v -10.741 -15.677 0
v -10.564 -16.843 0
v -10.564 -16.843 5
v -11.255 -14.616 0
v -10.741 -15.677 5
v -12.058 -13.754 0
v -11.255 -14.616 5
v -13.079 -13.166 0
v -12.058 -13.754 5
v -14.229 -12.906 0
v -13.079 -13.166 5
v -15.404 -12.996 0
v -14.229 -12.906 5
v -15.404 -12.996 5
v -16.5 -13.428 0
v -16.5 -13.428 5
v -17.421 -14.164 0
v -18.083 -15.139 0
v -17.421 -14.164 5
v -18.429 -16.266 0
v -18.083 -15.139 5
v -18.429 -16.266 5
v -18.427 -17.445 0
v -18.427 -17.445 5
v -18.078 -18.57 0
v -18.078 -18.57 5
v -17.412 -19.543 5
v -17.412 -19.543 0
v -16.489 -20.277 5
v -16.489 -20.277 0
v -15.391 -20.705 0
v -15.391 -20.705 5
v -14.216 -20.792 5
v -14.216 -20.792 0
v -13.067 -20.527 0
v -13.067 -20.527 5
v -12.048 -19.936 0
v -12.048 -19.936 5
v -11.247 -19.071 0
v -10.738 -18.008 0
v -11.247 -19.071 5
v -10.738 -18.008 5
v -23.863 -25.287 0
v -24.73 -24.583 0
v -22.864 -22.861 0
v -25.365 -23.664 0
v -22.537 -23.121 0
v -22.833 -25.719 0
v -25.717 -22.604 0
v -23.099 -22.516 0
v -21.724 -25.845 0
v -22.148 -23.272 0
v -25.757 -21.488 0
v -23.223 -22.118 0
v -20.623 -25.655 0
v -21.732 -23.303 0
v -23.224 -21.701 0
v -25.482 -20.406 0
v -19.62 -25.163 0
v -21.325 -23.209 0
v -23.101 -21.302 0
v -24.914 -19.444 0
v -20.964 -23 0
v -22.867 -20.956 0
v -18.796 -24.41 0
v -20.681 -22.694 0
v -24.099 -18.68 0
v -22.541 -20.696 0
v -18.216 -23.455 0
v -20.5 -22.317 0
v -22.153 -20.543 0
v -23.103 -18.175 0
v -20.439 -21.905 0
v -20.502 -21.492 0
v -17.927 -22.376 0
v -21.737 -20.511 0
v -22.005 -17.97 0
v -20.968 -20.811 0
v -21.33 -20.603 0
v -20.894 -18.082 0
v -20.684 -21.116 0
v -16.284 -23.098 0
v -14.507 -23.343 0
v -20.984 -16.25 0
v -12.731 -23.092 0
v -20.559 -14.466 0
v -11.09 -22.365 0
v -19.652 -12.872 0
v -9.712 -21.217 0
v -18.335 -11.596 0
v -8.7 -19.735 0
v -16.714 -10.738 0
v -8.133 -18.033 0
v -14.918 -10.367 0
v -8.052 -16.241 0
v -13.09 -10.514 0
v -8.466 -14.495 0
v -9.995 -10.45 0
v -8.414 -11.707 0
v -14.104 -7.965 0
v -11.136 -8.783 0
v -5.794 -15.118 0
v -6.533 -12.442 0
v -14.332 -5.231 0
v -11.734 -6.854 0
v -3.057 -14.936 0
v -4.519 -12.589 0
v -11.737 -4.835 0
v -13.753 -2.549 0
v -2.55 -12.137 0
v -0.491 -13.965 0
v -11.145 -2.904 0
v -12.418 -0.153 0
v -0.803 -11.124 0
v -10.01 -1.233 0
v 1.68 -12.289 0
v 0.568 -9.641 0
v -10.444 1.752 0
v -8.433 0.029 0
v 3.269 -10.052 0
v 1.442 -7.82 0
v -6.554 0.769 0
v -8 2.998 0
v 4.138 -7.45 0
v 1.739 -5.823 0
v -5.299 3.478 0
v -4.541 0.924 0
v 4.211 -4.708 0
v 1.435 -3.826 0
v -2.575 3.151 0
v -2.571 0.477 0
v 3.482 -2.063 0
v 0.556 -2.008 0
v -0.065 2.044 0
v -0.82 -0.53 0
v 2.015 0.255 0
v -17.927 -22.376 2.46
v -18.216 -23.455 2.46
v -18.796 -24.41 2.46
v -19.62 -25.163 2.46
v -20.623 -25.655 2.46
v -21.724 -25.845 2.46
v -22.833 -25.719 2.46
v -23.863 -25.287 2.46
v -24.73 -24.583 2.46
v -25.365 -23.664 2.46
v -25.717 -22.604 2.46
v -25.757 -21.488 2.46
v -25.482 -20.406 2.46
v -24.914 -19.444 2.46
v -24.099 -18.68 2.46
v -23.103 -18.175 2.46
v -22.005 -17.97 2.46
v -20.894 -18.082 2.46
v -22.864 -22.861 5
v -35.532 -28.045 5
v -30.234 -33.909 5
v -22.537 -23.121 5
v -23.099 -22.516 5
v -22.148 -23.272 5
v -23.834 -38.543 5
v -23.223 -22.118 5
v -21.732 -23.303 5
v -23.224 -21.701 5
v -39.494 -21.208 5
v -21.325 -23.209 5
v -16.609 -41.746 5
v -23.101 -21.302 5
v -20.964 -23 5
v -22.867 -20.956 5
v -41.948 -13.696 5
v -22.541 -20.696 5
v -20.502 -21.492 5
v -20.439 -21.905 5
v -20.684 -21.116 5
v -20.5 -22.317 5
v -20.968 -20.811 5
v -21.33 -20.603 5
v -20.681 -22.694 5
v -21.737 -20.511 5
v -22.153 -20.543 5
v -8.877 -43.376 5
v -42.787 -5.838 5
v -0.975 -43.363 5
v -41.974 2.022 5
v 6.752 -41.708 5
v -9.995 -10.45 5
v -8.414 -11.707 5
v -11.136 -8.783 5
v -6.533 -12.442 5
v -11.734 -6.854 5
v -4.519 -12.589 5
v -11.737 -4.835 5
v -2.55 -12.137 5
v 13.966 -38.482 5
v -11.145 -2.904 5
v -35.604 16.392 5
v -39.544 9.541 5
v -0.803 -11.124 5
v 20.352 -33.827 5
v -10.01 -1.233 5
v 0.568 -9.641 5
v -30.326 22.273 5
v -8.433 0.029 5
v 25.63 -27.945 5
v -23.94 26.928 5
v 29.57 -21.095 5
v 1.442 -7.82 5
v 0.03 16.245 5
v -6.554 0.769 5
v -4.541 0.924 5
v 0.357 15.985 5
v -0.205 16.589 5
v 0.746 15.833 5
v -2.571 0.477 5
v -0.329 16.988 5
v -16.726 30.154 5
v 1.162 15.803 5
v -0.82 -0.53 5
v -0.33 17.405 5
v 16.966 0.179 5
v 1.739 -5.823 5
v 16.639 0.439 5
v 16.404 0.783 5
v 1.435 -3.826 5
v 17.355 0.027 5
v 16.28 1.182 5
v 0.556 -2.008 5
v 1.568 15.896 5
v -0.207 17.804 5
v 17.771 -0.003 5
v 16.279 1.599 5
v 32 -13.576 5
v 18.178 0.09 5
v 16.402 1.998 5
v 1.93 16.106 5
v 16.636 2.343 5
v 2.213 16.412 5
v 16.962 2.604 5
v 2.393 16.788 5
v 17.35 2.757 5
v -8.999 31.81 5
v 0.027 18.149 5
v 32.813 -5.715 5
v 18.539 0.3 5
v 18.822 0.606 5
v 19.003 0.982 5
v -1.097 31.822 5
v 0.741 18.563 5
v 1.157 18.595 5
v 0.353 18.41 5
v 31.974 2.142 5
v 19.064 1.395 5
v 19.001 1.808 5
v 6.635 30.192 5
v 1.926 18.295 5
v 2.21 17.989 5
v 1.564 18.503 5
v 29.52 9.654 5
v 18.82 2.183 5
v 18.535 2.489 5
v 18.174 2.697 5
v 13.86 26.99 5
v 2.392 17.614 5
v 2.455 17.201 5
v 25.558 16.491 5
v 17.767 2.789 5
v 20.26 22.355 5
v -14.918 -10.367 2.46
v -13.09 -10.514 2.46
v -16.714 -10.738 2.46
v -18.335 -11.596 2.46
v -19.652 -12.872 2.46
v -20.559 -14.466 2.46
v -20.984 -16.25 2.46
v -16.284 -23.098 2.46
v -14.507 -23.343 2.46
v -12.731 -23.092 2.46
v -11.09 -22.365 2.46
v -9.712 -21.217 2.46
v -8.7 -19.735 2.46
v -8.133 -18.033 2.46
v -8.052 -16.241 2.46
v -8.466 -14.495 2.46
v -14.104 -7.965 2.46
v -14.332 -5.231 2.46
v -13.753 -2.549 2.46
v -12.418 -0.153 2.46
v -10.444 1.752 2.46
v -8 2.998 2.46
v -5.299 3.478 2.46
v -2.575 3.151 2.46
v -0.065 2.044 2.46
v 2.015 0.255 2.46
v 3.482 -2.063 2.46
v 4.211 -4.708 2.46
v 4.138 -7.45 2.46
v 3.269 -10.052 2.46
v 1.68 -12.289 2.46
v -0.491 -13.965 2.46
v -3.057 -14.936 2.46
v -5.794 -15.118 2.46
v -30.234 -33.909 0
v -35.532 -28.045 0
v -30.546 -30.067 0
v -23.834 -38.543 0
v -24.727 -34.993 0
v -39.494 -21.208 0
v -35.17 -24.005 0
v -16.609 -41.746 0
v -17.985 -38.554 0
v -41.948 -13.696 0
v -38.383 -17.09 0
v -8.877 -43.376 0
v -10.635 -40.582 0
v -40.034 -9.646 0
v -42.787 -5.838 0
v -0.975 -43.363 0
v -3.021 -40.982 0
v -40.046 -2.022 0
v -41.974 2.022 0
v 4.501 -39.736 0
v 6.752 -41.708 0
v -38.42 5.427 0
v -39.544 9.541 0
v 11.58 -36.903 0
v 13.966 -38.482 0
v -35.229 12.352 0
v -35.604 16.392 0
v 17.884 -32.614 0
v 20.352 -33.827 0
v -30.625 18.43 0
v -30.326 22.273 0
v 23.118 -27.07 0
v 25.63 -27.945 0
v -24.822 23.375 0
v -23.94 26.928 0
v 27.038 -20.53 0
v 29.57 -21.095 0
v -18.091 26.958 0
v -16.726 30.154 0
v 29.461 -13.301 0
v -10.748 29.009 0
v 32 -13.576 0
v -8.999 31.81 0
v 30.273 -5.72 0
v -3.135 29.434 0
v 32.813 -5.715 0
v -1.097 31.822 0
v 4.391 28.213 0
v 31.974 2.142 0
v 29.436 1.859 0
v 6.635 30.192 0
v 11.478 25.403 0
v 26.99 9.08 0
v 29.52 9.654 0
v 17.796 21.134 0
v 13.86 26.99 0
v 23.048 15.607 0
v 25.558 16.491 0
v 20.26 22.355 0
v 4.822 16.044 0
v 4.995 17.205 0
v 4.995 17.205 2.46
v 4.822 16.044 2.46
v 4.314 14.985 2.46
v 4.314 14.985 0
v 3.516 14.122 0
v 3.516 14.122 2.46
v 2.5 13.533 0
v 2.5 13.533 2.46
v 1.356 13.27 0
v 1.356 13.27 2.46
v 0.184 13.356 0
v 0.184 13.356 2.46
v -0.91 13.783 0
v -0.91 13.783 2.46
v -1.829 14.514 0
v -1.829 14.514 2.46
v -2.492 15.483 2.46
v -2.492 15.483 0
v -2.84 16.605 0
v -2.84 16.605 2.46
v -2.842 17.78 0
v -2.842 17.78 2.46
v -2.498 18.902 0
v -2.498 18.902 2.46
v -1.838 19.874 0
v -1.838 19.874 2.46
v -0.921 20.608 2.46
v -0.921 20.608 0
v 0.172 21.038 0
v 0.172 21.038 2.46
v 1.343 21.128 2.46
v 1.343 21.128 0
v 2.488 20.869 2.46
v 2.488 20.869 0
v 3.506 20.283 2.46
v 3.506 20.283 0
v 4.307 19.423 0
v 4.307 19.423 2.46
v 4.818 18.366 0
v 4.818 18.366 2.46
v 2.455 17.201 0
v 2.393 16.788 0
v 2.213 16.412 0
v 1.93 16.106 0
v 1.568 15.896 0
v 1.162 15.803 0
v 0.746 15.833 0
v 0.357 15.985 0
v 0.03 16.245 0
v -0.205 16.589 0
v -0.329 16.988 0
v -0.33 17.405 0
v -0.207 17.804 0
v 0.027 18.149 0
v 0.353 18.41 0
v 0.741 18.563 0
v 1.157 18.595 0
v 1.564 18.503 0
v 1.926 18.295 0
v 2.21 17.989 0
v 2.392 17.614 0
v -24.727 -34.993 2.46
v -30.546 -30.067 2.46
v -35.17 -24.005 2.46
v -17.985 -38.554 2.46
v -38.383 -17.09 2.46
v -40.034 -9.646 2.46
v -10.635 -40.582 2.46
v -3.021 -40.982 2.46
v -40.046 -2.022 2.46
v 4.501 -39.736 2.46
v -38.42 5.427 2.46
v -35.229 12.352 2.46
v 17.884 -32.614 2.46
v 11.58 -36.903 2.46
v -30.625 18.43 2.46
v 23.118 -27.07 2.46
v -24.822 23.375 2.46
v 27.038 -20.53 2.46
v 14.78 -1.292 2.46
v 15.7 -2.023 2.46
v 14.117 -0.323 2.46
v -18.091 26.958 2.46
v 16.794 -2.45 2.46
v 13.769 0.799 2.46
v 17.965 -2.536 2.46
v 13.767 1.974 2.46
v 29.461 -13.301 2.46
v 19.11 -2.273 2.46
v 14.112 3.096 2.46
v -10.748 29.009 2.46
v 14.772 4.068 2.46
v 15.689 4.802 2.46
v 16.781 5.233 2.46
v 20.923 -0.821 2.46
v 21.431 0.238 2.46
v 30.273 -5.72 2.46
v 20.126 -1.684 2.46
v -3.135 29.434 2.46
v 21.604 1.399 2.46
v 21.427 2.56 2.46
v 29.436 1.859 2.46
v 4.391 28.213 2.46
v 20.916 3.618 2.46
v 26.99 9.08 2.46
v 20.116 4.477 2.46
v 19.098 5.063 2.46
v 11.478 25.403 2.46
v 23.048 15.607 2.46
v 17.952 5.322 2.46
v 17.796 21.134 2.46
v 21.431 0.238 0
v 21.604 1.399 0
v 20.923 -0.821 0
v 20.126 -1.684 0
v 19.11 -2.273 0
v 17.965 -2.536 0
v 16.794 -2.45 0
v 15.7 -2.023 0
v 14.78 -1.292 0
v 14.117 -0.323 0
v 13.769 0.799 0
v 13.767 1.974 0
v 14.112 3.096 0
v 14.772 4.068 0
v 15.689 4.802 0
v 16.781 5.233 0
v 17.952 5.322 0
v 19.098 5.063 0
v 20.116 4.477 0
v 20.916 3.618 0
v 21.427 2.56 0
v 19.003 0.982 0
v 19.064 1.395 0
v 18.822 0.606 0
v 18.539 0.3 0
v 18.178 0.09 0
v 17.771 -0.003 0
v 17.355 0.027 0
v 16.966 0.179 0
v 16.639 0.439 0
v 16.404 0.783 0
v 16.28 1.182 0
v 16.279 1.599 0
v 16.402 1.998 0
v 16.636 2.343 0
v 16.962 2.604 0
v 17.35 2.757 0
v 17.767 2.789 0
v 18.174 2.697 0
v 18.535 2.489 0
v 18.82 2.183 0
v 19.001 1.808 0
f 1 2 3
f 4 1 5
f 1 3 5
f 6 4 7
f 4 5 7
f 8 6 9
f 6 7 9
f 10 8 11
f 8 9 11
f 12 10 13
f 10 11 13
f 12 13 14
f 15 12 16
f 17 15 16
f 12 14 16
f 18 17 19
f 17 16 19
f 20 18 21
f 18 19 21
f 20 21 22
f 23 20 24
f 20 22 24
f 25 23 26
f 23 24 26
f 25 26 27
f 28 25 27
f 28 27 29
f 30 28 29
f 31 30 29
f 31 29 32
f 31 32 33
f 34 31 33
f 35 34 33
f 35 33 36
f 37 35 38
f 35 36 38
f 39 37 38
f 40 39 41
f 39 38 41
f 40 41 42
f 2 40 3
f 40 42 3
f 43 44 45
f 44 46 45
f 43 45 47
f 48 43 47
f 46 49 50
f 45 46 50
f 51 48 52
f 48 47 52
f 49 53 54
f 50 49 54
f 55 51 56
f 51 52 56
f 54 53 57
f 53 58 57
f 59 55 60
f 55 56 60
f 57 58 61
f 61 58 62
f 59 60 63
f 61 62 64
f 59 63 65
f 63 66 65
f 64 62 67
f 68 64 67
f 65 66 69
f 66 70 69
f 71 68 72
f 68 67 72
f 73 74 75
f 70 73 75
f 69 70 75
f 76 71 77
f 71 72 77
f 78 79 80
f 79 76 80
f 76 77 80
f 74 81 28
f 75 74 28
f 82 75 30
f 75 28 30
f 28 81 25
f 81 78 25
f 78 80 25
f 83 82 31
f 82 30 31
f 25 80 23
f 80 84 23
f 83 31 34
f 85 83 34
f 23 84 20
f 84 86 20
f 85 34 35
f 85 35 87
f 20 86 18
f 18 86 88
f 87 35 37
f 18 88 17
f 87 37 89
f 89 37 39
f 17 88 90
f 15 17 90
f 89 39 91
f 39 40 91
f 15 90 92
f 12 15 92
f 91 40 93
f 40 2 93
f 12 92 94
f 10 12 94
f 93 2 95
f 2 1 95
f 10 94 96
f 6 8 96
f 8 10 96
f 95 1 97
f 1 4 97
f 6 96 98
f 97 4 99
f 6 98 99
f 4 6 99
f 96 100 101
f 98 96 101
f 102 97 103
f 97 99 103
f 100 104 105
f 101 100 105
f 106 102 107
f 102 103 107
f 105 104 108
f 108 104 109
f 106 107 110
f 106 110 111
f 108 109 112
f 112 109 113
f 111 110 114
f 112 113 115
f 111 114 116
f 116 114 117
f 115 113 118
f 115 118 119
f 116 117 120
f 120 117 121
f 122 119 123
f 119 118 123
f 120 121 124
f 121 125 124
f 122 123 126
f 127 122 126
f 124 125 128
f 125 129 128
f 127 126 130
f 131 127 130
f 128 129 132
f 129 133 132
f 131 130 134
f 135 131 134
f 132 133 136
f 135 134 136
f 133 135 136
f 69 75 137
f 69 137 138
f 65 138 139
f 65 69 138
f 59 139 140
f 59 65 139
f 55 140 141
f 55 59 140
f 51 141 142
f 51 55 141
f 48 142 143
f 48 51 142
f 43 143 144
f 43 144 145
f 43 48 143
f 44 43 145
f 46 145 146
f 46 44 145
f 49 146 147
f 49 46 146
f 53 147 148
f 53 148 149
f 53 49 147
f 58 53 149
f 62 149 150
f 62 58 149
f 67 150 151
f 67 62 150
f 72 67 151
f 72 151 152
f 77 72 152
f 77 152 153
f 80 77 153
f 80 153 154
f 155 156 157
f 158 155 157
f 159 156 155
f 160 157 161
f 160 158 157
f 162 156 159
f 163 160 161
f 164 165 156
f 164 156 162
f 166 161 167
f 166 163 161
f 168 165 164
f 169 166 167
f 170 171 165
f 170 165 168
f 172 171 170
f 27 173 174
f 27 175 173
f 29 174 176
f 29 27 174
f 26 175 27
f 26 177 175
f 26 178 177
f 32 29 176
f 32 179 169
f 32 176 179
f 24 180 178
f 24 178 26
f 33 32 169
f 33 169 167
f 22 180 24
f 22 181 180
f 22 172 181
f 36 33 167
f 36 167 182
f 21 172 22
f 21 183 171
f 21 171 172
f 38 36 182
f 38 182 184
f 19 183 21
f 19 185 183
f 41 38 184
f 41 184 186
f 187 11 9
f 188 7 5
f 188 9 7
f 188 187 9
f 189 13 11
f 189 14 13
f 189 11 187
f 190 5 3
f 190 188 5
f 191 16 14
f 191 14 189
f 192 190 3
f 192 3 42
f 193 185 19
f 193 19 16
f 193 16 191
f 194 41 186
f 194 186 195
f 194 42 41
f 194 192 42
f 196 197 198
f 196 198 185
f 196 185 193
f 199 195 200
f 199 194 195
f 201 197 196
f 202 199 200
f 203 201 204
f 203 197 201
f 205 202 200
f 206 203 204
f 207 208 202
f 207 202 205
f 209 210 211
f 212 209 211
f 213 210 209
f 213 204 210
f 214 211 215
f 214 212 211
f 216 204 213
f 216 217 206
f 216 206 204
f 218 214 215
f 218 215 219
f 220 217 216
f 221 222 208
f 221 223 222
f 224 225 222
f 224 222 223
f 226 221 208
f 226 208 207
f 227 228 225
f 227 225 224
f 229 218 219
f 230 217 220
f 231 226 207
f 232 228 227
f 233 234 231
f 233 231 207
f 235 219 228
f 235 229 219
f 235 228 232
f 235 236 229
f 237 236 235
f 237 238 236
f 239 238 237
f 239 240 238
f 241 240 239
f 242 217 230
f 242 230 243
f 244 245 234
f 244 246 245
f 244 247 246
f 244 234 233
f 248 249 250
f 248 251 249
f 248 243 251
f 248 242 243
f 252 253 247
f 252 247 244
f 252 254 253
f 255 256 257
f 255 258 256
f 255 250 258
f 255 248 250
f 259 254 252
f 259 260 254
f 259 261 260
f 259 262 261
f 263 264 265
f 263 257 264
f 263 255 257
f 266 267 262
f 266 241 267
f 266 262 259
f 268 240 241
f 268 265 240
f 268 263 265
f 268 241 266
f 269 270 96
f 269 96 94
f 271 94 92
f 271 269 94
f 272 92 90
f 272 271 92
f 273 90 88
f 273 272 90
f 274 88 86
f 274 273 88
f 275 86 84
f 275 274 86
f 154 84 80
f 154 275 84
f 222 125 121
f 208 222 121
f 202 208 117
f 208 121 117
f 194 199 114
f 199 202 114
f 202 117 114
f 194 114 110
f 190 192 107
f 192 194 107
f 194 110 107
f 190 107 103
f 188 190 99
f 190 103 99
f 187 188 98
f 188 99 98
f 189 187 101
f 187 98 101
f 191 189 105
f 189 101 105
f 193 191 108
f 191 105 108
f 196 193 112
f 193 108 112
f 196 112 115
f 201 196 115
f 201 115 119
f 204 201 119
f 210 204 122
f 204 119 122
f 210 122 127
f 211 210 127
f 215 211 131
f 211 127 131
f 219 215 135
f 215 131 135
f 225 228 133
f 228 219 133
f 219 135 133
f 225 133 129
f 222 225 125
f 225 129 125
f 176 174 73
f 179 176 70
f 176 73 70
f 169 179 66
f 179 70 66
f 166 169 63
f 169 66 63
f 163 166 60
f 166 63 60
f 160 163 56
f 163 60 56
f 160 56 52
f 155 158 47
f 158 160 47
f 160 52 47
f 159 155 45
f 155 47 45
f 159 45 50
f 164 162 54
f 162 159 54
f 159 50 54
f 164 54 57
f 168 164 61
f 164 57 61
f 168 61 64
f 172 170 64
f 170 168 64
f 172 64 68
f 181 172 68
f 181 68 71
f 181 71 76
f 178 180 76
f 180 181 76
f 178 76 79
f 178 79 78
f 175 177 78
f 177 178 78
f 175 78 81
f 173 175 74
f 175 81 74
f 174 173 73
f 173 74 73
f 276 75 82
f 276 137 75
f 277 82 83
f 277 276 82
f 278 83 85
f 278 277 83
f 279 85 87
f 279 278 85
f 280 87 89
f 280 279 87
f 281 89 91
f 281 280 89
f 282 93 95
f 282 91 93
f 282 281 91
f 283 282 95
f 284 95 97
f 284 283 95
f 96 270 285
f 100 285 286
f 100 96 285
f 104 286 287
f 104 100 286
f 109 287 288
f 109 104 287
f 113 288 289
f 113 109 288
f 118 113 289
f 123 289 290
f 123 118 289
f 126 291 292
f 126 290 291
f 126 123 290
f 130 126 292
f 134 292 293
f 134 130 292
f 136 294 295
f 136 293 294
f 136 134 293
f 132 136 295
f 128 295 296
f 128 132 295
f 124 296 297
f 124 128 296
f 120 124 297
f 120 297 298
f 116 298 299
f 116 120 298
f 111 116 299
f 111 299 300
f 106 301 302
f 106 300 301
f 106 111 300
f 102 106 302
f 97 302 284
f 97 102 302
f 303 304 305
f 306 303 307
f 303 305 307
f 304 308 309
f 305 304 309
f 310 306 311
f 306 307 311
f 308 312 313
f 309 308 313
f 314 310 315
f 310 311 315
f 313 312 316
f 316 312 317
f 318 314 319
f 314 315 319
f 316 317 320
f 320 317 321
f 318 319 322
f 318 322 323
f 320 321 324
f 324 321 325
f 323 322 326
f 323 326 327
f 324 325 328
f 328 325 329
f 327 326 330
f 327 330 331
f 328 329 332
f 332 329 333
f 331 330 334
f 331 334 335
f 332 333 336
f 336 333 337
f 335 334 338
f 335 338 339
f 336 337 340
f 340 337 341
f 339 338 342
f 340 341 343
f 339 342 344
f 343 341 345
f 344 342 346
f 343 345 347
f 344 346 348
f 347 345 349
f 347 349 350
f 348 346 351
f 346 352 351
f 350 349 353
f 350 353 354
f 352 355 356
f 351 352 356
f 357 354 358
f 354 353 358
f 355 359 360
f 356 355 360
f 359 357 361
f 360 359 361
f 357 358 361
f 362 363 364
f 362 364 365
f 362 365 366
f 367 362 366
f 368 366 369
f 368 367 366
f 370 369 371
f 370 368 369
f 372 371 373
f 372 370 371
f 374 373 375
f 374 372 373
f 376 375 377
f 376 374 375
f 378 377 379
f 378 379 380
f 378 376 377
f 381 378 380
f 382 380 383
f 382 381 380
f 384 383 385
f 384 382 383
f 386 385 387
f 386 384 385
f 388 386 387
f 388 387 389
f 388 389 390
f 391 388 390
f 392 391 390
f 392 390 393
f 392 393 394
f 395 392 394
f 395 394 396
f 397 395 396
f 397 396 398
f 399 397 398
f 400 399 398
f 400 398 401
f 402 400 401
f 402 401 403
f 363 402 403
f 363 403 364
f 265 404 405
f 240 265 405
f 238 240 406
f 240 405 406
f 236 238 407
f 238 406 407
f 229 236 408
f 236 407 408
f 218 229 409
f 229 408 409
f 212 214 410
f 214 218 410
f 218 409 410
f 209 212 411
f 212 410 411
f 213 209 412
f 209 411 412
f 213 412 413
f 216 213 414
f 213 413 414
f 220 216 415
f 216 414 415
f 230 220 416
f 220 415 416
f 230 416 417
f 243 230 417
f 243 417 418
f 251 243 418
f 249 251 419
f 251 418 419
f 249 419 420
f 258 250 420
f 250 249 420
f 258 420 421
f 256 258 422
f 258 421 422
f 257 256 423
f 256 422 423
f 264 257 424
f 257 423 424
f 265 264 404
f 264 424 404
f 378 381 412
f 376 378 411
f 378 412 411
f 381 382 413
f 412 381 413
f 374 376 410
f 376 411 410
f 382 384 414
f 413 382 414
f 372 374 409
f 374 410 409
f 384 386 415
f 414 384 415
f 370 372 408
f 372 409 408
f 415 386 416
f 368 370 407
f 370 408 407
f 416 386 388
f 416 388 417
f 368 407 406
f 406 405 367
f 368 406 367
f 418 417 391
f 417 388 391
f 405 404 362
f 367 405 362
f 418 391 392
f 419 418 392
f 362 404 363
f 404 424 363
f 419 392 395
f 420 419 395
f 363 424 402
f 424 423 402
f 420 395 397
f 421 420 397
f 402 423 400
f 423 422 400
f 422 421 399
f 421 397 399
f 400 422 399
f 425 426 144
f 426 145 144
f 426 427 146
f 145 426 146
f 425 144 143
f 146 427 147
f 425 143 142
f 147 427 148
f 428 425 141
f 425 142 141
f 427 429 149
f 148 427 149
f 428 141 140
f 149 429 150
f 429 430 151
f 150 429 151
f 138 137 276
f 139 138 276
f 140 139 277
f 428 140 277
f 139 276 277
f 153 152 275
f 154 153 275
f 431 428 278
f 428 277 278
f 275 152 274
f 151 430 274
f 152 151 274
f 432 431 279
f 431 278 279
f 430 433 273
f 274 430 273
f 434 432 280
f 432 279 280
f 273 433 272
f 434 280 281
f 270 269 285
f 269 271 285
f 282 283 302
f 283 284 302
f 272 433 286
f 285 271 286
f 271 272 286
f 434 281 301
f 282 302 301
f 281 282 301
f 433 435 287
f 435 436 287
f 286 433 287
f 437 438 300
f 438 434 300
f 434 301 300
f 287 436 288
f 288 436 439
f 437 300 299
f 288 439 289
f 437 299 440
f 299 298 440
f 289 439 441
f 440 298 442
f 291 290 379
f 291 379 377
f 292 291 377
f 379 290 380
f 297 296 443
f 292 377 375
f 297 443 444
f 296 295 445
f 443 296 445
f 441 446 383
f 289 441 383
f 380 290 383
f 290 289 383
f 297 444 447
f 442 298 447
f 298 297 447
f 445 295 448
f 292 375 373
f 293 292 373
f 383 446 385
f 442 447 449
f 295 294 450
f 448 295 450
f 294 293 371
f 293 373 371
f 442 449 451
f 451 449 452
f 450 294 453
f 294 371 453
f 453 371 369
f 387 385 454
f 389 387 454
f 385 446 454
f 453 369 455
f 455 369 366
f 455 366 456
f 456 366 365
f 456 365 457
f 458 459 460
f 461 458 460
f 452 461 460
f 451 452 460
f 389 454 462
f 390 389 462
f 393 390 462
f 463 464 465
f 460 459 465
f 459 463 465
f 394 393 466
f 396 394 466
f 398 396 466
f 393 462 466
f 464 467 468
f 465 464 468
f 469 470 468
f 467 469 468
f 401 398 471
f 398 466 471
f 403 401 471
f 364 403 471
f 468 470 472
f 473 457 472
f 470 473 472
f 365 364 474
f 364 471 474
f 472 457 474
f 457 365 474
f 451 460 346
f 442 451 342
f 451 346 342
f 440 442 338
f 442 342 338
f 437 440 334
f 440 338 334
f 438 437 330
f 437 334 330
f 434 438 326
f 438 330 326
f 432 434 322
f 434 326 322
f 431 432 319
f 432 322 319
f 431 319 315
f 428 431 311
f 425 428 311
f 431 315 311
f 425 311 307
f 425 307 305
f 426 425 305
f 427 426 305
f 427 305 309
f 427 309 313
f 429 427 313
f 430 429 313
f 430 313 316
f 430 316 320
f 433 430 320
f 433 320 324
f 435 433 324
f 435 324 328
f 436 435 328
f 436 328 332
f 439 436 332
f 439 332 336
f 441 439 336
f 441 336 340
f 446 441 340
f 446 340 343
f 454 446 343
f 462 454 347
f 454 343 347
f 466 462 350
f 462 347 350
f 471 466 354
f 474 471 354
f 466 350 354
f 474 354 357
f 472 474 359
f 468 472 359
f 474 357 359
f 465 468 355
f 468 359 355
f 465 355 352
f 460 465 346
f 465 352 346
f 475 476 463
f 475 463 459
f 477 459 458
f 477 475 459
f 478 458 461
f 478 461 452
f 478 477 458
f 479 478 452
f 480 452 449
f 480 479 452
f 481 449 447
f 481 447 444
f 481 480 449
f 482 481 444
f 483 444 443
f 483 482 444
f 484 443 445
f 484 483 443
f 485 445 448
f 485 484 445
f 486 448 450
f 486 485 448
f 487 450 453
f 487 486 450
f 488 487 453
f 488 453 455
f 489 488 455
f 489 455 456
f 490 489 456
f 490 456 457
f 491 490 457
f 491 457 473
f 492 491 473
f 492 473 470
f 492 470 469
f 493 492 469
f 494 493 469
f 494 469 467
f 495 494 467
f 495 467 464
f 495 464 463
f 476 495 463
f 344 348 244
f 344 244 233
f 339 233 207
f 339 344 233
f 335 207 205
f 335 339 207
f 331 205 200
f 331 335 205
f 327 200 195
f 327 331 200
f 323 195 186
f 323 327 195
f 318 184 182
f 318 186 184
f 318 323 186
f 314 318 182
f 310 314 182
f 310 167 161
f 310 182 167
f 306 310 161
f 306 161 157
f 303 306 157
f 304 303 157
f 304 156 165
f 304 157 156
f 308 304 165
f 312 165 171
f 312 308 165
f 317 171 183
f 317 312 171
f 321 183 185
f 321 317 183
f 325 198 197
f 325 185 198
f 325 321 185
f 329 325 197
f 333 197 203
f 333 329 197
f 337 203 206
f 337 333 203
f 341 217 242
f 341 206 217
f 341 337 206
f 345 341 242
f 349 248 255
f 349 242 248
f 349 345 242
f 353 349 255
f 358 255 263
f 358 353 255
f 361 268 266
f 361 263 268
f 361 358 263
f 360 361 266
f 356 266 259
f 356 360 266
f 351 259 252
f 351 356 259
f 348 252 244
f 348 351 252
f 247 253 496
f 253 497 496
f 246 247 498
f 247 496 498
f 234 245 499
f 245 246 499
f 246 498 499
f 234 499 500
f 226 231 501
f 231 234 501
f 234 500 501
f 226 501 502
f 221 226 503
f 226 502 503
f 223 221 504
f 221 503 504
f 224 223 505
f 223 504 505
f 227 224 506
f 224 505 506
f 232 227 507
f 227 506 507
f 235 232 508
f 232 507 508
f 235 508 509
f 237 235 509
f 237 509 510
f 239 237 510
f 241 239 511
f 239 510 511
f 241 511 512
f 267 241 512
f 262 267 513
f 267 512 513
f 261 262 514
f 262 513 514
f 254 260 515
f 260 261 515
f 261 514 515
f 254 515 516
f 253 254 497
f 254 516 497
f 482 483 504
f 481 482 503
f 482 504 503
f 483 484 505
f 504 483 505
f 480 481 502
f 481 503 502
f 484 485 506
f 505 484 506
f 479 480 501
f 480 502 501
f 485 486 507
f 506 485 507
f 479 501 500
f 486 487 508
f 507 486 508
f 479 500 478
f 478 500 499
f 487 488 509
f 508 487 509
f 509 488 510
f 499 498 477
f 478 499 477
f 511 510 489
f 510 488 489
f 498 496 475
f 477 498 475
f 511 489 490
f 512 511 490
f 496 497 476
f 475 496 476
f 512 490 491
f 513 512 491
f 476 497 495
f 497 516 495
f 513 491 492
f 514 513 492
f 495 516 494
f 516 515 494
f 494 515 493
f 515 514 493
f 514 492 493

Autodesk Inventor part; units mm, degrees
ref_plane "YZ Plane" through (0, 0, 0) normal (1, 0, 0) x (0, 1, 0)
ref_plane "XZ Plane" through (0, 0, 0) normal (0, 1, 0) x (-1, 0, 0)
ref_plane "XY Plane" through (0, 0, 0) normal (0, 0, 1) x (1, 0, 0)
ref_plane "Work Plane1" through (-4.987218, -5.774768, 0) normal (0, 0, 1) x (0.9999987, 0.0016281, 0)
sketch "Sketch1" plane through (-4.987218, -5.774768, 0) normal (0, 0, 1) x (0.9999987, 0.0016281, 0)
  circle A0 centre (0.000199, -0.002158) radius 38.1
  circle A1 centre (0.000199, -0.002158) radius 37.8
  circle A2 centre (-0.048773, -0.058769) radius 6.775396
  circle A3 centre (6.079487, 22.963606) radius 1.4
  circle A4 centre (-16.87798, -16.104757) radius 1.4
  circle A5 centre (22.663033, 7.130604) radius 1.4
  point P0 (4.996614, 5.76664)
  dimension "d0" = 0.3
sketch "Sketch1 outline for Extrusion1" plane through (-4.987218, -5.774768, 0) normal (0, 0, 1) x (0.9999987, 0.0016281, 0)
  circle A0 centre (0.000199, -0.002158) radius 37.8
  circle A1 centre (-16.87798, -16.104757) radius 1.4
  circle A2 centre (-0.048773, -0.058769) radius 6.775396
  circle A3 centre (22.663033, 7.130604) radius 1.4
  circle A4 centre (6.079487, 22.963606) radius 1.4
extrude "Extrusion1" add sketch "Sketch1 outline for Extrusion1" along normal blind 5
sketch "Sketch4" plane through (-4.987218, -5.774768, 5) normal (0, 0, 1) x (0.9999987, 0.0016281, 0)
  circle A0 centre (19.372358, 5.196915) radius 1.4
  circle A1 centre (-9.548696, -11.058773) radius 1.352011
  circle A2 centre (-9.548696, -11.058773) radius 3.95399
  point P0 (4.996614, 5.76664)
extrude "Extrusion4" cut sketch "Sketch4" against normal blind 25.4 contours A1 | A2
shell "Shell1" thickness 2.54 removed faces 1 at (15.854163, -10.364044, 0)
properties part number "Anglerfish_3inch_tube_adapterplate_focus"
